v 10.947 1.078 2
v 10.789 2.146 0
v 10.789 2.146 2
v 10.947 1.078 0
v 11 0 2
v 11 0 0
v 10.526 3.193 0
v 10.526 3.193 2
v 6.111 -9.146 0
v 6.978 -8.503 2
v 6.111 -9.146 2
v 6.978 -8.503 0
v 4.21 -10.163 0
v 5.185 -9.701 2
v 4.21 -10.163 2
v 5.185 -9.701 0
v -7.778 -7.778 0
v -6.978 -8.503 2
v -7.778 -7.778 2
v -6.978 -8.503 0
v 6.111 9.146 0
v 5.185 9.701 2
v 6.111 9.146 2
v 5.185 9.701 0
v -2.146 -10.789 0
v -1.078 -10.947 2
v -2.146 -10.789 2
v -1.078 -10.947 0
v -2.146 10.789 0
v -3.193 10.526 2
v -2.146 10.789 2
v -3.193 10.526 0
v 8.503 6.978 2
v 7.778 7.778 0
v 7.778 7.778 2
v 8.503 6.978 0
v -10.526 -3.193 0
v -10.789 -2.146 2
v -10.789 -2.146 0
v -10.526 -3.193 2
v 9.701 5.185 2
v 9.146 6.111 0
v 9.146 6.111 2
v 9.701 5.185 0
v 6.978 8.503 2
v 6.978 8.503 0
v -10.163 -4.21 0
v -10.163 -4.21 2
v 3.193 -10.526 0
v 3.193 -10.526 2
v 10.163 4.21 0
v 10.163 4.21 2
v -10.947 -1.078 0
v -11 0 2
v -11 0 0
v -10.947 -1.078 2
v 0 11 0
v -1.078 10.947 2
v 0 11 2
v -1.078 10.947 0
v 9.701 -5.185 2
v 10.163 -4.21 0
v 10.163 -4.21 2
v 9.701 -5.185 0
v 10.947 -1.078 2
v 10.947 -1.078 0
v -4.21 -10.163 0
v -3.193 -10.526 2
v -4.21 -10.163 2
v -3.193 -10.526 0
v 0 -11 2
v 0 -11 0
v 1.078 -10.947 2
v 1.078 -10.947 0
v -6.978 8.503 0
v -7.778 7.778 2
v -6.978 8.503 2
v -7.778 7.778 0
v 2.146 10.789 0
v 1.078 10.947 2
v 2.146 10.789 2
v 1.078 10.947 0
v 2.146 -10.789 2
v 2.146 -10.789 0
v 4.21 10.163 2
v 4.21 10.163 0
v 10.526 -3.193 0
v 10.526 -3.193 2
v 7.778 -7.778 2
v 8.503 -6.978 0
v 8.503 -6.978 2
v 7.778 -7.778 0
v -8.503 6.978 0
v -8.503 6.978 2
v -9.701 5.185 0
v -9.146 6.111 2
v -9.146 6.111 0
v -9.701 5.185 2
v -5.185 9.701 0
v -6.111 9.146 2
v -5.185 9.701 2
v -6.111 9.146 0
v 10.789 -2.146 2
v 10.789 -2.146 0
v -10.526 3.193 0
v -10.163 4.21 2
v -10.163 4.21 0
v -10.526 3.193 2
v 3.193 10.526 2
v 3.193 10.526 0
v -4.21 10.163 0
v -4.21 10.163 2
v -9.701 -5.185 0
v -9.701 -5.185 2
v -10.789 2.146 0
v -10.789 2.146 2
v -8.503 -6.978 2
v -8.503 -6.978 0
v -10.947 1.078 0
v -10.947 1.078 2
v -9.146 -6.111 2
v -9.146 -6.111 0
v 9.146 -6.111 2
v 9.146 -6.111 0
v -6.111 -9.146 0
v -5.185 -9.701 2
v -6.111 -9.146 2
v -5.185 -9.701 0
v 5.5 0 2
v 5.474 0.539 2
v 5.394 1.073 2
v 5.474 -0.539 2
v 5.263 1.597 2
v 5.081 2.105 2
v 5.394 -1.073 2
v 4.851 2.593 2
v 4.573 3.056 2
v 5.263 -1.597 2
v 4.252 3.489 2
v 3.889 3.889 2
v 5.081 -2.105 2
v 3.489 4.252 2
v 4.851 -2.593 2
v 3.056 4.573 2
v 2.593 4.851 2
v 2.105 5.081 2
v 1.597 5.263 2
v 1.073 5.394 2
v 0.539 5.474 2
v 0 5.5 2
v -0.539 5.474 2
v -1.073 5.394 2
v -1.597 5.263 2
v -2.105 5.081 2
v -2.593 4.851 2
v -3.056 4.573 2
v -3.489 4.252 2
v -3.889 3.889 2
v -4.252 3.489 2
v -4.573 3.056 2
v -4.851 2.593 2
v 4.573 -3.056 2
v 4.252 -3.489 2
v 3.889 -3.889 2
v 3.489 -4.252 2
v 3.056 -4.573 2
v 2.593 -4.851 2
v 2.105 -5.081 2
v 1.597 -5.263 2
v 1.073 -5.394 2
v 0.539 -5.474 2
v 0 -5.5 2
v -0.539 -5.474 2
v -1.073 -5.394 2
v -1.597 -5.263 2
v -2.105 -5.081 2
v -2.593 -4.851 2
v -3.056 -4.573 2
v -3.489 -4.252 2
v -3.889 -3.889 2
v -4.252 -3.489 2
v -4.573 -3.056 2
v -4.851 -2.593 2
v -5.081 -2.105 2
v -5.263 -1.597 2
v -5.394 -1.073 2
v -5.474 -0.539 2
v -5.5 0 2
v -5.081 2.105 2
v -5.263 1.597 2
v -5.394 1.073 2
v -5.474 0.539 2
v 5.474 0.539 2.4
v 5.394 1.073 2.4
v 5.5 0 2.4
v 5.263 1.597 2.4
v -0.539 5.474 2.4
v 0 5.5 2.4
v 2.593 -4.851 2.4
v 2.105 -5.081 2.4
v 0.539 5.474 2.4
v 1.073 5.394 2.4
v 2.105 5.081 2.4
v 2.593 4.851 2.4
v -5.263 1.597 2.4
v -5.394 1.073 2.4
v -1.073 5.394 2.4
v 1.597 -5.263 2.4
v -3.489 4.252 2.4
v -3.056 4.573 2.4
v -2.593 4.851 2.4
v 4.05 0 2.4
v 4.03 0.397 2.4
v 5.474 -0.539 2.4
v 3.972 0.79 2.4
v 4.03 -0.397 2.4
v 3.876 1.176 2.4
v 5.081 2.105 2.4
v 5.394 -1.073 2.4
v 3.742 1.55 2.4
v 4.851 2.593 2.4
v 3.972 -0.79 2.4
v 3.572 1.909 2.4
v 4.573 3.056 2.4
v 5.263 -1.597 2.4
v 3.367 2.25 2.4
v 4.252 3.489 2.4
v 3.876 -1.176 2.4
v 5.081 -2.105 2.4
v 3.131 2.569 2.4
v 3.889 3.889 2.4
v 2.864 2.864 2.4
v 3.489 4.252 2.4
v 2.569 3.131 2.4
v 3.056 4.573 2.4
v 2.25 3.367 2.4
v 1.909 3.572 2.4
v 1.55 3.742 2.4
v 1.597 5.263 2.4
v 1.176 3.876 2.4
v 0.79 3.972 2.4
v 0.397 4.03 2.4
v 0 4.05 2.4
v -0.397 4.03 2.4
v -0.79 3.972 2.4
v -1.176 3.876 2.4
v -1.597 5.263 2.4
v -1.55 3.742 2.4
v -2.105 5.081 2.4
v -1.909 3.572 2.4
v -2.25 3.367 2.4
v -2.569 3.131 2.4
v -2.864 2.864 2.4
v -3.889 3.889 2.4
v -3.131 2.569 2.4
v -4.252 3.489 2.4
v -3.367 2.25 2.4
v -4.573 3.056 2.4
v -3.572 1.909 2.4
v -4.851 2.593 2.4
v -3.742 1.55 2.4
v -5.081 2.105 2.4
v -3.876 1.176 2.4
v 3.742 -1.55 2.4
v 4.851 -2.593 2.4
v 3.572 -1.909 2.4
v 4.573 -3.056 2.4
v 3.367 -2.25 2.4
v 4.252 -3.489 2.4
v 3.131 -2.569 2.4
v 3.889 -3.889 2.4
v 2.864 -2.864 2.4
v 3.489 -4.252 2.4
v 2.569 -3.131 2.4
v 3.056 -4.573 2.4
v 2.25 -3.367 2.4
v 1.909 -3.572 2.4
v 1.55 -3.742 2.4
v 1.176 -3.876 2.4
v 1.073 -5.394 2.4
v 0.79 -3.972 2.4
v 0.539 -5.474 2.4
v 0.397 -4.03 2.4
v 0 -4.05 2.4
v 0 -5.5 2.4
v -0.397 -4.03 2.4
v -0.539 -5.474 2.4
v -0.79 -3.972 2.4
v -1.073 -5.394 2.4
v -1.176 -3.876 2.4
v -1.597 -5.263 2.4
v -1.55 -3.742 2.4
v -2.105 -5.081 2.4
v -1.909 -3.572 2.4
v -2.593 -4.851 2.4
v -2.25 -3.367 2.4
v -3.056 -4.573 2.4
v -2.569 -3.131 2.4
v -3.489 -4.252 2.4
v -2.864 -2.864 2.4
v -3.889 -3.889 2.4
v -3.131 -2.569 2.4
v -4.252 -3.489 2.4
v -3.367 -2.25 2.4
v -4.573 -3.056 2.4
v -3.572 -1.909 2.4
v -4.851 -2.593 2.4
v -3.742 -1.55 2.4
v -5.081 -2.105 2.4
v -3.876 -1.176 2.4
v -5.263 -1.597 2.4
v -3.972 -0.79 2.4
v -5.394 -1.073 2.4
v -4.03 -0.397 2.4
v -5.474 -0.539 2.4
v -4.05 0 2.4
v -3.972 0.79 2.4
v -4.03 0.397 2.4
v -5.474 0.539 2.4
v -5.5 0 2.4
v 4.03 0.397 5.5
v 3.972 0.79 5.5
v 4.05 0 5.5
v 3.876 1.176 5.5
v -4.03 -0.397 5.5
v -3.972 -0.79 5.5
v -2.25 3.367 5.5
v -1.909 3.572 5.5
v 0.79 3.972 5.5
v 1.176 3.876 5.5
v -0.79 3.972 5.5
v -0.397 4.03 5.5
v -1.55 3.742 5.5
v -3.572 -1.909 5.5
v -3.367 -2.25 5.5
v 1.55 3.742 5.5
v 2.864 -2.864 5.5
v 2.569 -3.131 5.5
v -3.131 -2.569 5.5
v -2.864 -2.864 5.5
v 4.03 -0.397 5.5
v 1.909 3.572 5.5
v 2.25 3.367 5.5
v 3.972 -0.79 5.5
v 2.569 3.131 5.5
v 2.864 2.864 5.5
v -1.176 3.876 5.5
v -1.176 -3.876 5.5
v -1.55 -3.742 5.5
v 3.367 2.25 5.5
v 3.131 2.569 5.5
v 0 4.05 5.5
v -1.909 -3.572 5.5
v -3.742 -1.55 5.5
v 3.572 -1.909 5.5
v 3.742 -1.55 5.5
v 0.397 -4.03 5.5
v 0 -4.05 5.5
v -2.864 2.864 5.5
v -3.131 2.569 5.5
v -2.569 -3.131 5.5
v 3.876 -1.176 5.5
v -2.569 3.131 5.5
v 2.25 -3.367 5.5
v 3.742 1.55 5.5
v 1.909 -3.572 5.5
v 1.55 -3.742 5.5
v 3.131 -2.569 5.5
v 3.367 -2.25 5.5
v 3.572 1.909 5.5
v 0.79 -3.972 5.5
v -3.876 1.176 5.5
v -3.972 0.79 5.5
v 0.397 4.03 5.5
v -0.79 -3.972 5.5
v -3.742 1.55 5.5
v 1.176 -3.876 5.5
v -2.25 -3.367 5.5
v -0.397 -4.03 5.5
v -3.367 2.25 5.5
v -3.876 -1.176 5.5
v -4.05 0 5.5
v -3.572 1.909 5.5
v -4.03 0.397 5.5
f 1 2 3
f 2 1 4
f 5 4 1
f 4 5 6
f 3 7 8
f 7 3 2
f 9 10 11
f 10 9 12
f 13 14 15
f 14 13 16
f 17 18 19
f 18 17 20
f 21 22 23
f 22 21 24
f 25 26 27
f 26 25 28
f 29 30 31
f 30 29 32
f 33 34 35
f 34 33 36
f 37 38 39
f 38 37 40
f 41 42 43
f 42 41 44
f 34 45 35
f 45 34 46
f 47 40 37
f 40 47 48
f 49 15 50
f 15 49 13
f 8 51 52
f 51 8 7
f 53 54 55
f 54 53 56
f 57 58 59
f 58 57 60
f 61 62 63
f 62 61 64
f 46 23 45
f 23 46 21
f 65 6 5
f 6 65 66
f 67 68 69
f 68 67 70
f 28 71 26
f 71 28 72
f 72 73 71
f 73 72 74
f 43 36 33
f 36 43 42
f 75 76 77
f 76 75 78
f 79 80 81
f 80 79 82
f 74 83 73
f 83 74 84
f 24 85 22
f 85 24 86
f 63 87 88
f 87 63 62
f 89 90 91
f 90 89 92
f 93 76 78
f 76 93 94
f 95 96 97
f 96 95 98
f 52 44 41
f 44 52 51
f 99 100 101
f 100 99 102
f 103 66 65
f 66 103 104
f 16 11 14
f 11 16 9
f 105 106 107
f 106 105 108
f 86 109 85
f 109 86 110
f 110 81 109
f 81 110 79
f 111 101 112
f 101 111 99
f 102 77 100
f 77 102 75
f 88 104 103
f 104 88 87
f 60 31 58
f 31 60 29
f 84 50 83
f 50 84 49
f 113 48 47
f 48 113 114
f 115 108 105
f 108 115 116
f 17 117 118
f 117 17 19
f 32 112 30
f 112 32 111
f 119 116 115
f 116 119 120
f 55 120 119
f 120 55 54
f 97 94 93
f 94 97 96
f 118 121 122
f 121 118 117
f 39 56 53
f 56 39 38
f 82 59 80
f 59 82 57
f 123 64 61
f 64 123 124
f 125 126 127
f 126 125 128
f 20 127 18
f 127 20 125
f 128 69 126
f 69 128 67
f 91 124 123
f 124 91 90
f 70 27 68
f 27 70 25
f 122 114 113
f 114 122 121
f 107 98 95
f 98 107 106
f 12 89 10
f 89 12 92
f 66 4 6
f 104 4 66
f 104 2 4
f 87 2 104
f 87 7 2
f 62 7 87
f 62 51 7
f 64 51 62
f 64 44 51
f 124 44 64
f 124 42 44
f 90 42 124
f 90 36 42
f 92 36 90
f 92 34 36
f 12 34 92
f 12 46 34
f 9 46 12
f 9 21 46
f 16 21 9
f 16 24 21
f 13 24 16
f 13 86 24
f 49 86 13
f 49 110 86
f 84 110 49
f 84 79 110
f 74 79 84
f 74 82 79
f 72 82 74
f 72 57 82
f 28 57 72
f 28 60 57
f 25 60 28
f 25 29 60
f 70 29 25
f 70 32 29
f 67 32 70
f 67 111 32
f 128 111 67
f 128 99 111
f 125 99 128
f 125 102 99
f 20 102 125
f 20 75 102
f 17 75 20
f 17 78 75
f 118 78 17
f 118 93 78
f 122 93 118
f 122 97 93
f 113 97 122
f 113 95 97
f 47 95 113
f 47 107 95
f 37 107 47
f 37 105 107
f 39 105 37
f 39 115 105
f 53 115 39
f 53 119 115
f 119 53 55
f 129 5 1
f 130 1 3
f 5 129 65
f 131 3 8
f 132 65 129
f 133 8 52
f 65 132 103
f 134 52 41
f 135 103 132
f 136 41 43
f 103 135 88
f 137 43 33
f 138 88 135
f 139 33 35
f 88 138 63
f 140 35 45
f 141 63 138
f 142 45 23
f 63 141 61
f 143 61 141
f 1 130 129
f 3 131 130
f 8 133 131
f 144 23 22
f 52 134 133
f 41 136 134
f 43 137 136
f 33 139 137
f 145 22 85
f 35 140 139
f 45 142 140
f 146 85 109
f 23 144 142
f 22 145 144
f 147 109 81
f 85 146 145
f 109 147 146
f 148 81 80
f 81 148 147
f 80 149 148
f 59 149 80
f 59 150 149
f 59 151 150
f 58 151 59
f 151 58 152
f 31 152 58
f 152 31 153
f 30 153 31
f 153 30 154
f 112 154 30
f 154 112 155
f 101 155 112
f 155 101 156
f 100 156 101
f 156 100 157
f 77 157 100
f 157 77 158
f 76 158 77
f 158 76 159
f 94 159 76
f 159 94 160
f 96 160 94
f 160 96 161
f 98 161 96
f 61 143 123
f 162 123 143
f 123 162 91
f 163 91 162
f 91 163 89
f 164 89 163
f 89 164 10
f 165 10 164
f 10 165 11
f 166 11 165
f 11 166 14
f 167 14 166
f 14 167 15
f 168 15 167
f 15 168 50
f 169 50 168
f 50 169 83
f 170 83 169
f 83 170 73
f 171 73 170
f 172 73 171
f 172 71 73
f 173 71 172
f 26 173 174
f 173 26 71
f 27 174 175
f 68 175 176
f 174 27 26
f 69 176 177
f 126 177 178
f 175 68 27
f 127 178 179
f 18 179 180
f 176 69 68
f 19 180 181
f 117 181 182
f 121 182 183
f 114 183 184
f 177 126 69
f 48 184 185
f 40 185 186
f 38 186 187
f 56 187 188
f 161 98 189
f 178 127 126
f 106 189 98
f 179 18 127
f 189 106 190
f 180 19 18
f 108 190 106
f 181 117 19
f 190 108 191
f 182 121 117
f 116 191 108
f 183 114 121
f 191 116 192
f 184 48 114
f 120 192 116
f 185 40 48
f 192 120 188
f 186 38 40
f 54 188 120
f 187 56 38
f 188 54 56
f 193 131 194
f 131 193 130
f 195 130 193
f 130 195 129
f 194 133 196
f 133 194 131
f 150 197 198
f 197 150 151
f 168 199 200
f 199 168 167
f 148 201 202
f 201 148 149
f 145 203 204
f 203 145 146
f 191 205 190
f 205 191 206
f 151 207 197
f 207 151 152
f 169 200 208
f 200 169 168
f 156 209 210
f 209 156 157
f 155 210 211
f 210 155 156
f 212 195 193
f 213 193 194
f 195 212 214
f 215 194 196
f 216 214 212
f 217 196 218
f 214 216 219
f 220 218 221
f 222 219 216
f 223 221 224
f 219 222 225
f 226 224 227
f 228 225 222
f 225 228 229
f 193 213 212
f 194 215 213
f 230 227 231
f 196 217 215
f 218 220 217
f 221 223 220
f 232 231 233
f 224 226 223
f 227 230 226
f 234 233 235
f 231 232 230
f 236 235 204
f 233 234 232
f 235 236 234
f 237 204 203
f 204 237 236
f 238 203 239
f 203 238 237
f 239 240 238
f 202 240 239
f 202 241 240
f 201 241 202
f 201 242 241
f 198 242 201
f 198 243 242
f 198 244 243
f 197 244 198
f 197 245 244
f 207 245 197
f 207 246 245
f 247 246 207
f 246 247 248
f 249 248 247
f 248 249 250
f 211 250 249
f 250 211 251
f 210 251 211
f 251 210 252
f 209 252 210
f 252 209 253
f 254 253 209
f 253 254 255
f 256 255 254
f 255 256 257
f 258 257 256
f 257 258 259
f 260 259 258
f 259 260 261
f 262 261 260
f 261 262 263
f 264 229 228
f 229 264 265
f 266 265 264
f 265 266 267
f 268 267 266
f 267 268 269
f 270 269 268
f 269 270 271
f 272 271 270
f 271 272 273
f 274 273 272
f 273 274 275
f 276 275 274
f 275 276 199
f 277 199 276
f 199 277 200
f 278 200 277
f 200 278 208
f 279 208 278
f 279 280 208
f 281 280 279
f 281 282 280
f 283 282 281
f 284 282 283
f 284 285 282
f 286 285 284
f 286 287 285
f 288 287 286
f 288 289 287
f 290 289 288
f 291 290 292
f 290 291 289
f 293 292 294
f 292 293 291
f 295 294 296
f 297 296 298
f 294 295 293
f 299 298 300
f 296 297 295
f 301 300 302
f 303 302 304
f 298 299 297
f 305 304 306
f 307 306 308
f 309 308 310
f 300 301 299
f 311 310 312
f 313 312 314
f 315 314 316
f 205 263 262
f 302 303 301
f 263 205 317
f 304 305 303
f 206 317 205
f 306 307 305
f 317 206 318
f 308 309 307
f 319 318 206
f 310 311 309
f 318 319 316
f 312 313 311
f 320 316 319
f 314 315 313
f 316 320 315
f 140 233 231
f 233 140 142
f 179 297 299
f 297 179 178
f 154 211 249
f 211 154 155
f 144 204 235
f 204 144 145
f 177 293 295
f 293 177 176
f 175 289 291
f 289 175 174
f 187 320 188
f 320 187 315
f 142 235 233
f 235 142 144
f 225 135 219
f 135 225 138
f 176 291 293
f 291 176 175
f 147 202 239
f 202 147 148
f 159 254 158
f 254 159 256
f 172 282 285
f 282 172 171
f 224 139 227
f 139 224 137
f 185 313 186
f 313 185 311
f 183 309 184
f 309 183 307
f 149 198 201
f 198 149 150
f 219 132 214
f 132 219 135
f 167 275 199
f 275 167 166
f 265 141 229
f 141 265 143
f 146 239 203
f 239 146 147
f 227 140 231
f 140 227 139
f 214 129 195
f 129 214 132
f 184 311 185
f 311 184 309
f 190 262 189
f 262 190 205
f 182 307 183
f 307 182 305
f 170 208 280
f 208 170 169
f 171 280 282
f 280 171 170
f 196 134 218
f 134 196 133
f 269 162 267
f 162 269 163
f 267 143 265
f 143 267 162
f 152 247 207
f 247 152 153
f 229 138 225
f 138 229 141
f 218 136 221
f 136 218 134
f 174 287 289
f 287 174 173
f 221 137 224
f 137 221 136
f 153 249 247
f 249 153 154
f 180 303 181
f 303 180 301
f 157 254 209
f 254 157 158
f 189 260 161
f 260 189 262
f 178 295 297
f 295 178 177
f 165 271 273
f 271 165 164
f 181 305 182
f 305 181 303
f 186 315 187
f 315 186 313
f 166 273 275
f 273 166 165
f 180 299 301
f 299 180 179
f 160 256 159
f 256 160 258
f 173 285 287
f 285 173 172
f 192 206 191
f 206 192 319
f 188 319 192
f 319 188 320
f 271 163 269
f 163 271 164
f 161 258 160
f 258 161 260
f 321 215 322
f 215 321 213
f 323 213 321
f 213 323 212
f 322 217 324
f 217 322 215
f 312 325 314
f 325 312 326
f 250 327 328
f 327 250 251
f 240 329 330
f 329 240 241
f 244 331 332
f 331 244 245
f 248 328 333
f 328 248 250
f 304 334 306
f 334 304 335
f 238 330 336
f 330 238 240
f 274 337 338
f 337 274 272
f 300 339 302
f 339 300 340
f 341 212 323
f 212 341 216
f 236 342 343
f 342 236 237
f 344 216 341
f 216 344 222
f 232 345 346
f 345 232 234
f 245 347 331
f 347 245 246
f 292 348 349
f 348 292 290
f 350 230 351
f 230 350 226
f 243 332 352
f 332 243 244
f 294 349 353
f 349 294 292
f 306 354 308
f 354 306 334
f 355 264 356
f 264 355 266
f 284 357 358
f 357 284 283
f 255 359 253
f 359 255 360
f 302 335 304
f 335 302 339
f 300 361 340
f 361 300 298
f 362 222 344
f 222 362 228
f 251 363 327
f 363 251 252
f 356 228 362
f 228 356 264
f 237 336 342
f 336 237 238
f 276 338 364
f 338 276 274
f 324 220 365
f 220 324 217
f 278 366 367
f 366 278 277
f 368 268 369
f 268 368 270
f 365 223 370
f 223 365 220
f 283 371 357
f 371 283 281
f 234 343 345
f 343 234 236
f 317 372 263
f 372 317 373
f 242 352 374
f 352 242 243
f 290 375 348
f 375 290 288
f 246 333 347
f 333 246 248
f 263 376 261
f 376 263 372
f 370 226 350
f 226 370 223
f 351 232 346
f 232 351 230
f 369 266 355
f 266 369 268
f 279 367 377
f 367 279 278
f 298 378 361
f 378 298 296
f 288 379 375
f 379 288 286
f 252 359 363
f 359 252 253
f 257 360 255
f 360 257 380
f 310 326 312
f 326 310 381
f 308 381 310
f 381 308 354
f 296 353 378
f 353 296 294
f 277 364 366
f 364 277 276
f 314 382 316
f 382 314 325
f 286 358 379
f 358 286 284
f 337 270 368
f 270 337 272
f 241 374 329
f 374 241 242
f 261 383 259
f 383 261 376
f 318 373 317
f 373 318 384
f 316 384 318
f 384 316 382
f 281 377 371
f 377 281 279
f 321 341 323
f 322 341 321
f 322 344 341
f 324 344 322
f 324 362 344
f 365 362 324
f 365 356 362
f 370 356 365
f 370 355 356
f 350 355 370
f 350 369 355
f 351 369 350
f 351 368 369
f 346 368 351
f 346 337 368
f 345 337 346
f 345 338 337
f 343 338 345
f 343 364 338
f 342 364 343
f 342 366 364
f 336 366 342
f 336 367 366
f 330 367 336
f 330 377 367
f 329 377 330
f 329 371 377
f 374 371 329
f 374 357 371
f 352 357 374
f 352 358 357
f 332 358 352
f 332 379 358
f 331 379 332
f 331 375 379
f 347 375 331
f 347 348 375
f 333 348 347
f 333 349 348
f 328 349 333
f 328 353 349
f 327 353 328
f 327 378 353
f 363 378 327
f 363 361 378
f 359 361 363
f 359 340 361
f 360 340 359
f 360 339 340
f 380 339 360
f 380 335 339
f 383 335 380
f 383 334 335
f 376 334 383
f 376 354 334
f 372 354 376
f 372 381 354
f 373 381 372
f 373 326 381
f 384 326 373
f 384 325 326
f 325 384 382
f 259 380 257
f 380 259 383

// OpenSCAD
bearing_out_diam = 22;
bearing_in_diam = 8.1;
bearing_height = 7;
inner_ring_diam = 11;

cap_height = 2;
clearance = 0.4;

$fn=64;

union()
{
  cylinder(d=bearing_out_diam, h=cap_height);
  translate([0,0,cap_height]) cylinder(d=inner_ring_diam, h=clearance);
  translate([0,0,cap_height+clearance]) cylinder(d=bearing_in_diam, h=(bearing_height/2-clearance));
}
